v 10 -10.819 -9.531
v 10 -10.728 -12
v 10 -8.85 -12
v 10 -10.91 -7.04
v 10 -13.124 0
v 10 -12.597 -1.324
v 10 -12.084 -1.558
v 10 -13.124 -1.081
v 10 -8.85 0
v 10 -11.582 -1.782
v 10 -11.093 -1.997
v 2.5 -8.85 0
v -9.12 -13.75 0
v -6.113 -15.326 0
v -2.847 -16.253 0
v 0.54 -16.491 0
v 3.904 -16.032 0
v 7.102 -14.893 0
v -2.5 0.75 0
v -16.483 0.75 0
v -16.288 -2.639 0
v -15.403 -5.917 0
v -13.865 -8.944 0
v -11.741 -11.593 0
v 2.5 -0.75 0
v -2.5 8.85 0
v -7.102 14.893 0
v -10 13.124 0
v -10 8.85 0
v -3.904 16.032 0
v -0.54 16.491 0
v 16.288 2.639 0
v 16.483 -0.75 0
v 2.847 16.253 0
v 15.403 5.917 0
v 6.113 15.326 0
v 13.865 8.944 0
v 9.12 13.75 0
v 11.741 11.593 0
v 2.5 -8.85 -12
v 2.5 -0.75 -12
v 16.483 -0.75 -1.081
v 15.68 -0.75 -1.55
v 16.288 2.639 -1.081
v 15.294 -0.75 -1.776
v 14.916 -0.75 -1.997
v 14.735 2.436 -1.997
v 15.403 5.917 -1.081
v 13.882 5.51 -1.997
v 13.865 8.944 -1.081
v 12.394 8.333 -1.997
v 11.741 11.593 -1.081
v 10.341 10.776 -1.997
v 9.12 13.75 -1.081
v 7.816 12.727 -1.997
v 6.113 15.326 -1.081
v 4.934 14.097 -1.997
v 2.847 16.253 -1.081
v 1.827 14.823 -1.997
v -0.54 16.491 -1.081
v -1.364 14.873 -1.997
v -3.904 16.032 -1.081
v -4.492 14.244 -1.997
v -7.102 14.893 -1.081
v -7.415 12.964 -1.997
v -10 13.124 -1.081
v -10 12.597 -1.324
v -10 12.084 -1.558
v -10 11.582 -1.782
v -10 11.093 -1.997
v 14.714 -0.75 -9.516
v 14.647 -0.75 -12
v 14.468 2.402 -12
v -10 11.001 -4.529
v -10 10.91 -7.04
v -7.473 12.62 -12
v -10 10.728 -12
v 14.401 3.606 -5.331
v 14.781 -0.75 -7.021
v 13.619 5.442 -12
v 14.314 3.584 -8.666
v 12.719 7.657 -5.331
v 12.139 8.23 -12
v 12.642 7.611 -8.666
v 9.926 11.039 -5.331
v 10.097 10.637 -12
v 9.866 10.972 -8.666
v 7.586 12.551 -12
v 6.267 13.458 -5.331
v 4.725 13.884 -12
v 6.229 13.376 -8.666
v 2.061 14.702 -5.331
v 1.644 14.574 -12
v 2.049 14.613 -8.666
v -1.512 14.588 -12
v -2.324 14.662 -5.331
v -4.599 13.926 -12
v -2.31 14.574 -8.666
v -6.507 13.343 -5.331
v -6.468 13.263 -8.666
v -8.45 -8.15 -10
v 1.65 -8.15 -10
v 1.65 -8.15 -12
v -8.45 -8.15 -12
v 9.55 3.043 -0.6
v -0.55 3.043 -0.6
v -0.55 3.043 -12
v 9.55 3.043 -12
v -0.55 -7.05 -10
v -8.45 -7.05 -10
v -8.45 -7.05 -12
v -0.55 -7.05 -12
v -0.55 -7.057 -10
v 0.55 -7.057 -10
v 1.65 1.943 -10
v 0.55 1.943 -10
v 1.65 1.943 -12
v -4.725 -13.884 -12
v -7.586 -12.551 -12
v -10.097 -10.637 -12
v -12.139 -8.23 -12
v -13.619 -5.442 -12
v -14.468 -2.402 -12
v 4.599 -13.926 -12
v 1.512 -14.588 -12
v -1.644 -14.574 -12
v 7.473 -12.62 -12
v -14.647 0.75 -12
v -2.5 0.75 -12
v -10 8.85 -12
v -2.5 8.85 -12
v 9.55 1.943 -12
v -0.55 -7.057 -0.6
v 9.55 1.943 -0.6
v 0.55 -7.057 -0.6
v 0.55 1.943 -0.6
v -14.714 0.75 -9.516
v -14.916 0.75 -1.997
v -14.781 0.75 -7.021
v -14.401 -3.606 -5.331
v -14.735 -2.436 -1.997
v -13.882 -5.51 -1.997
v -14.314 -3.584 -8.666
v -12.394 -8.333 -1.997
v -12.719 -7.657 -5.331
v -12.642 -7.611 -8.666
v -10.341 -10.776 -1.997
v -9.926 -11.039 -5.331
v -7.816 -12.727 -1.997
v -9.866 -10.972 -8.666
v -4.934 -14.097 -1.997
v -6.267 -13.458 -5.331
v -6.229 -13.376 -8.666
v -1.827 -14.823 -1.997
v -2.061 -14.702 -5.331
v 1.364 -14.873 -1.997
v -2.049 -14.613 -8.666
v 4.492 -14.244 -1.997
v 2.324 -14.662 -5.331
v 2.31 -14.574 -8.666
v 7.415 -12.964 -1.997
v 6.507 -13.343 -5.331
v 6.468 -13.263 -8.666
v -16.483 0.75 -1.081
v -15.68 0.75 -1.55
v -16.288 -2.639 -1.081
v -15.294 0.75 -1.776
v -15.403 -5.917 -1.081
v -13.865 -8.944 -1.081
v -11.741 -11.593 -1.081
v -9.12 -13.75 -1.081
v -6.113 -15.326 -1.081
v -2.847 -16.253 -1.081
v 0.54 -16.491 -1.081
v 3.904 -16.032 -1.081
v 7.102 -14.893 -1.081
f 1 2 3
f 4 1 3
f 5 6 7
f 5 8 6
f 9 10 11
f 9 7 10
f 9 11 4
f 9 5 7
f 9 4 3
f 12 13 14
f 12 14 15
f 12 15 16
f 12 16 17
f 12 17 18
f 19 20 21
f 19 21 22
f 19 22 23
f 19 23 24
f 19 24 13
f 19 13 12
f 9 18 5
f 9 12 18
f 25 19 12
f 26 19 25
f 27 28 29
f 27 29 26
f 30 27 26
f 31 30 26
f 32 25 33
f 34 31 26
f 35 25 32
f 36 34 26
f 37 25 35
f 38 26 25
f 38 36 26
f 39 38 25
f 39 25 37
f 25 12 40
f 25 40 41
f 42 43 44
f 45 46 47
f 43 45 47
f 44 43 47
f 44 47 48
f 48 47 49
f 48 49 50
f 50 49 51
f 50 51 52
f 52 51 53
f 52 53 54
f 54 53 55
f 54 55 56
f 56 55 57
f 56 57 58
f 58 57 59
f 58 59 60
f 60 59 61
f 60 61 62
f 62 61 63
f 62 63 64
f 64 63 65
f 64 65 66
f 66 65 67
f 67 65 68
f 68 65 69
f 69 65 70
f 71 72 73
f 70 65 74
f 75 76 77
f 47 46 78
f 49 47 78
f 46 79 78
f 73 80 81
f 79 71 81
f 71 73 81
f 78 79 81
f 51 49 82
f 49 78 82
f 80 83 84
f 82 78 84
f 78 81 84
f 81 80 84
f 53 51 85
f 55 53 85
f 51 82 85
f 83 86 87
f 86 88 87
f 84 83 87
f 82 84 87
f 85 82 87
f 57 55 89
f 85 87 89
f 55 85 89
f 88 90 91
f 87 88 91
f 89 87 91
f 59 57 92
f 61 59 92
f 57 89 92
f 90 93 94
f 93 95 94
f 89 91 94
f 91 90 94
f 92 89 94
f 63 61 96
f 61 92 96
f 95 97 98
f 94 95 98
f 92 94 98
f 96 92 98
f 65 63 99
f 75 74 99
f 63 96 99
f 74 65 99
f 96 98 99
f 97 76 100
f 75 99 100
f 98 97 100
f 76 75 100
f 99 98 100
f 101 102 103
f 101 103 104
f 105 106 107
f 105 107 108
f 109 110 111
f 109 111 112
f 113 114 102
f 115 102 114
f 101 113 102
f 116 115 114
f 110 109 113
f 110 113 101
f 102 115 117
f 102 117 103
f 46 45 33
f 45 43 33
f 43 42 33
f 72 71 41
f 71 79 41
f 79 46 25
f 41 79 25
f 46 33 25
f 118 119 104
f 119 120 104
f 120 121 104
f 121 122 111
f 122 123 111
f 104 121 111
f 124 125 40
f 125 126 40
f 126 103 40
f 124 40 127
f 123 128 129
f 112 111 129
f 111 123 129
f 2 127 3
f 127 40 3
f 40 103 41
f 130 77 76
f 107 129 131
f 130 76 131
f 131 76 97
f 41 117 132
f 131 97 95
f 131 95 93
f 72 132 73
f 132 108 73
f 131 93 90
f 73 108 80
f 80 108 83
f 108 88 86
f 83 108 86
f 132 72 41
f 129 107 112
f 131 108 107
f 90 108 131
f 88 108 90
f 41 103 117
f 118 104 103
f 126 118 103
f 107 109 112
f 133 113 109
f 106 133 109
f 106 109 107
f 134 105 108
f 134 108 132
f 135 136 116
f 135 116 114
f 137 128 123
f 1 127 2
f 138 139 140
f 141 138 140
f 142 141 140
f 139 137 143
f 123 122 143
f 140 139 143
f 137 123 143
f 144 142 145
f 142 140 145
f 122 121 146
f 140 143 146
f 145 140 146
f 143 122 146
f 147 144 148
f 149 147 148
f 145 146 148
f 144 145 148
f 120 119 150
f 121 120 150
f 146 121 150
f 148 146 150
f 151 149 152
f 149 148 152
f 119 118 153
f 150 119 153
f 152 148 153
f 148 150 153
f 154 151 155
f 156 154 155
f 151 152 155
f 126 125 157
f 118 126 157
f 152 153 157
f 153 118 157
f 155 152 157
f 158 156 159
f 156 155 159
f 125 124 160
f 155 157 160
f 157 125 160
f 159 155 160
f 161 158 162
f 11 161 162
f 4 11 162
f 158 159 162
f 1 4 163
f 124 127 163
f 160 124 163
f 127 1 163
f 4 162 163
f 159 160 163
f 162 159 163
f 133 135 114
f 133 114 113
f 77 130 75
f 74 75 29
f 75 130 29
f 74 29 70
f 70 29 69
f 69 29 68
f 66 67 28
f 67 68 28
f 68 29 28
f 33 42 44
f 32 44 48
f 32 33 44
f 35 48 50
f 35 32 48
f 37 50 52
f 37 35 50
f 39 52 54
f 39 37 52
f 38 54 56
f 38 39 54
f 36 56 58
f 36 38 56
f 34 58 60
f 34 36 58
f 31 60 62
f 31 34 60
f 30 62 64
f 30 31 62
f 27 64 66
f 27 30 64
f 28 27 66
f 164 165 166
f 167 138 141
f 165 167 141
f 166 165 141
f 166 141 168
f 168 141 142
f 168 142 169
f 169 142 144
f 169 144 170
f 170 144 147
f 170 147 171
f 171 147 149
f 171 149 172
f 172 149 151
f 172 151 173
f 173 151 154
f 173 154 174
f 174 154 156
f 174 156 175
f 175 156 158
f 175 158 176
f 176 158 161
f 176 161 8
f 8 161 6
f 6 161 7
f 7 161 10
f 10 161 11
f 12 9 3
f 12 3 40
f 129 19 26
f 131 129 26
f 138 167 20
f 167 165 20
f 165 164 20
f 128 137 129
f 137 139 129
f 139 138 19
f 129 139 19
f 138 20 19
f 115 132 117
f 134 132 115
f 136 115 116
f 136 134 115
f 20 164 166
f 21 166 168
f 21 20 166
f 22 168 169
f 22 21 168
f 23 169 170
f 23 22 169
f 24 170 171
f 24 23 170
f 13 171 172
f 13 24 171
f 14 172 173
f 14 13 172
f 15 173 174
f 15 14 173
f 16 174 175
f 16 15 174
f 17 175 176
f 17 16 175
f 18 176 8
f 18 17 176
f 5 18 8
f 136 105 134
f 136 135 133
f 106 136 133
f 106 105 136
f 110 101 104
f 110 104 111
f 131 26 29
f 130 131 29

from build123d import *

# Parameters (mm, degrees)
PAD011_DEPTH    = 12
POCKET009_DEPTH = 11.401
POCKET010_DEPTH = 5


with BuildPart() as part:
    # Sketch031 → Pad011 (new body)
    with BuildSketch(Plane.XY):
        with BuildLine():
            ThreePointArc((16.4829457319, -0.75), (7.6571484981, 14.6156791453), (-10, 13.1244047484))
            Line((-10, 8.85), (-10, 13.1244047484))
            Line((-2.5, 8.85), (-10, 8.85))
            Line((-2.5, 0.75), (-2.5, 8.85))
            Line((-16.4829457319, 0.75), (-2.5, 0.75))
            ThreePointArc((-16.4829457319, 0.75), (-7.6571484981, -14.6156791453), (10, -13.1244047484))
            Line((10, -13.1244047484), (10, -8.85))
            Line((10, -8.85), (2.5, -8.85))
            Line((2.5, -8.85), (2.5, -0.75))
            Line((16.4829457319, -0.75), (2.5, -0.75))
        make_face()
    extrude(amount=-PAD011_DEPTH)

    # Sketch032 → Pocket009 (cut, through all)
    with BuildSketch(Plane.XY.offset(-0.6)):
        Polygon((-0.55, 3.043445), (9.55, 3.043445), (9.55, 1.943445), (0.55, 1.943445), (0.55, -7.056555), (-0.55, -7.056555), align=None)
    extrude(amount=-POCKET009_DEPTH, mode=Mode.SUBTRACT)

    # Sketch035 → Pocket010 (cut)
    with BuildSketch(Plane.XY.offset(-10)):
        Polygon((0.55, 2.15), (1.65, 2.15), (1.65, -8.15), (-8.45, -8.15), (-8.45, -7.05), (0.55, -7.05), align=None)
    extrude(amount=-POCKET010_DEPTH, mode=Mode.SUBTRACT)

    # Sketch046 → Groove (revolve, cut)
    with BuildSketch(Plane.YZ):
        Polygon((16.5, 0), (16.5, -1.080549), (14.935277, -1.996929), (14.625, -13.52658), (22.461165, -13.52658), (22.461165, 0), align=None)
    revolve(axis=Axis((0, 0, 0), (0, 0, 1)), mode=Mode.SUBTRACT)


solid = part.part
